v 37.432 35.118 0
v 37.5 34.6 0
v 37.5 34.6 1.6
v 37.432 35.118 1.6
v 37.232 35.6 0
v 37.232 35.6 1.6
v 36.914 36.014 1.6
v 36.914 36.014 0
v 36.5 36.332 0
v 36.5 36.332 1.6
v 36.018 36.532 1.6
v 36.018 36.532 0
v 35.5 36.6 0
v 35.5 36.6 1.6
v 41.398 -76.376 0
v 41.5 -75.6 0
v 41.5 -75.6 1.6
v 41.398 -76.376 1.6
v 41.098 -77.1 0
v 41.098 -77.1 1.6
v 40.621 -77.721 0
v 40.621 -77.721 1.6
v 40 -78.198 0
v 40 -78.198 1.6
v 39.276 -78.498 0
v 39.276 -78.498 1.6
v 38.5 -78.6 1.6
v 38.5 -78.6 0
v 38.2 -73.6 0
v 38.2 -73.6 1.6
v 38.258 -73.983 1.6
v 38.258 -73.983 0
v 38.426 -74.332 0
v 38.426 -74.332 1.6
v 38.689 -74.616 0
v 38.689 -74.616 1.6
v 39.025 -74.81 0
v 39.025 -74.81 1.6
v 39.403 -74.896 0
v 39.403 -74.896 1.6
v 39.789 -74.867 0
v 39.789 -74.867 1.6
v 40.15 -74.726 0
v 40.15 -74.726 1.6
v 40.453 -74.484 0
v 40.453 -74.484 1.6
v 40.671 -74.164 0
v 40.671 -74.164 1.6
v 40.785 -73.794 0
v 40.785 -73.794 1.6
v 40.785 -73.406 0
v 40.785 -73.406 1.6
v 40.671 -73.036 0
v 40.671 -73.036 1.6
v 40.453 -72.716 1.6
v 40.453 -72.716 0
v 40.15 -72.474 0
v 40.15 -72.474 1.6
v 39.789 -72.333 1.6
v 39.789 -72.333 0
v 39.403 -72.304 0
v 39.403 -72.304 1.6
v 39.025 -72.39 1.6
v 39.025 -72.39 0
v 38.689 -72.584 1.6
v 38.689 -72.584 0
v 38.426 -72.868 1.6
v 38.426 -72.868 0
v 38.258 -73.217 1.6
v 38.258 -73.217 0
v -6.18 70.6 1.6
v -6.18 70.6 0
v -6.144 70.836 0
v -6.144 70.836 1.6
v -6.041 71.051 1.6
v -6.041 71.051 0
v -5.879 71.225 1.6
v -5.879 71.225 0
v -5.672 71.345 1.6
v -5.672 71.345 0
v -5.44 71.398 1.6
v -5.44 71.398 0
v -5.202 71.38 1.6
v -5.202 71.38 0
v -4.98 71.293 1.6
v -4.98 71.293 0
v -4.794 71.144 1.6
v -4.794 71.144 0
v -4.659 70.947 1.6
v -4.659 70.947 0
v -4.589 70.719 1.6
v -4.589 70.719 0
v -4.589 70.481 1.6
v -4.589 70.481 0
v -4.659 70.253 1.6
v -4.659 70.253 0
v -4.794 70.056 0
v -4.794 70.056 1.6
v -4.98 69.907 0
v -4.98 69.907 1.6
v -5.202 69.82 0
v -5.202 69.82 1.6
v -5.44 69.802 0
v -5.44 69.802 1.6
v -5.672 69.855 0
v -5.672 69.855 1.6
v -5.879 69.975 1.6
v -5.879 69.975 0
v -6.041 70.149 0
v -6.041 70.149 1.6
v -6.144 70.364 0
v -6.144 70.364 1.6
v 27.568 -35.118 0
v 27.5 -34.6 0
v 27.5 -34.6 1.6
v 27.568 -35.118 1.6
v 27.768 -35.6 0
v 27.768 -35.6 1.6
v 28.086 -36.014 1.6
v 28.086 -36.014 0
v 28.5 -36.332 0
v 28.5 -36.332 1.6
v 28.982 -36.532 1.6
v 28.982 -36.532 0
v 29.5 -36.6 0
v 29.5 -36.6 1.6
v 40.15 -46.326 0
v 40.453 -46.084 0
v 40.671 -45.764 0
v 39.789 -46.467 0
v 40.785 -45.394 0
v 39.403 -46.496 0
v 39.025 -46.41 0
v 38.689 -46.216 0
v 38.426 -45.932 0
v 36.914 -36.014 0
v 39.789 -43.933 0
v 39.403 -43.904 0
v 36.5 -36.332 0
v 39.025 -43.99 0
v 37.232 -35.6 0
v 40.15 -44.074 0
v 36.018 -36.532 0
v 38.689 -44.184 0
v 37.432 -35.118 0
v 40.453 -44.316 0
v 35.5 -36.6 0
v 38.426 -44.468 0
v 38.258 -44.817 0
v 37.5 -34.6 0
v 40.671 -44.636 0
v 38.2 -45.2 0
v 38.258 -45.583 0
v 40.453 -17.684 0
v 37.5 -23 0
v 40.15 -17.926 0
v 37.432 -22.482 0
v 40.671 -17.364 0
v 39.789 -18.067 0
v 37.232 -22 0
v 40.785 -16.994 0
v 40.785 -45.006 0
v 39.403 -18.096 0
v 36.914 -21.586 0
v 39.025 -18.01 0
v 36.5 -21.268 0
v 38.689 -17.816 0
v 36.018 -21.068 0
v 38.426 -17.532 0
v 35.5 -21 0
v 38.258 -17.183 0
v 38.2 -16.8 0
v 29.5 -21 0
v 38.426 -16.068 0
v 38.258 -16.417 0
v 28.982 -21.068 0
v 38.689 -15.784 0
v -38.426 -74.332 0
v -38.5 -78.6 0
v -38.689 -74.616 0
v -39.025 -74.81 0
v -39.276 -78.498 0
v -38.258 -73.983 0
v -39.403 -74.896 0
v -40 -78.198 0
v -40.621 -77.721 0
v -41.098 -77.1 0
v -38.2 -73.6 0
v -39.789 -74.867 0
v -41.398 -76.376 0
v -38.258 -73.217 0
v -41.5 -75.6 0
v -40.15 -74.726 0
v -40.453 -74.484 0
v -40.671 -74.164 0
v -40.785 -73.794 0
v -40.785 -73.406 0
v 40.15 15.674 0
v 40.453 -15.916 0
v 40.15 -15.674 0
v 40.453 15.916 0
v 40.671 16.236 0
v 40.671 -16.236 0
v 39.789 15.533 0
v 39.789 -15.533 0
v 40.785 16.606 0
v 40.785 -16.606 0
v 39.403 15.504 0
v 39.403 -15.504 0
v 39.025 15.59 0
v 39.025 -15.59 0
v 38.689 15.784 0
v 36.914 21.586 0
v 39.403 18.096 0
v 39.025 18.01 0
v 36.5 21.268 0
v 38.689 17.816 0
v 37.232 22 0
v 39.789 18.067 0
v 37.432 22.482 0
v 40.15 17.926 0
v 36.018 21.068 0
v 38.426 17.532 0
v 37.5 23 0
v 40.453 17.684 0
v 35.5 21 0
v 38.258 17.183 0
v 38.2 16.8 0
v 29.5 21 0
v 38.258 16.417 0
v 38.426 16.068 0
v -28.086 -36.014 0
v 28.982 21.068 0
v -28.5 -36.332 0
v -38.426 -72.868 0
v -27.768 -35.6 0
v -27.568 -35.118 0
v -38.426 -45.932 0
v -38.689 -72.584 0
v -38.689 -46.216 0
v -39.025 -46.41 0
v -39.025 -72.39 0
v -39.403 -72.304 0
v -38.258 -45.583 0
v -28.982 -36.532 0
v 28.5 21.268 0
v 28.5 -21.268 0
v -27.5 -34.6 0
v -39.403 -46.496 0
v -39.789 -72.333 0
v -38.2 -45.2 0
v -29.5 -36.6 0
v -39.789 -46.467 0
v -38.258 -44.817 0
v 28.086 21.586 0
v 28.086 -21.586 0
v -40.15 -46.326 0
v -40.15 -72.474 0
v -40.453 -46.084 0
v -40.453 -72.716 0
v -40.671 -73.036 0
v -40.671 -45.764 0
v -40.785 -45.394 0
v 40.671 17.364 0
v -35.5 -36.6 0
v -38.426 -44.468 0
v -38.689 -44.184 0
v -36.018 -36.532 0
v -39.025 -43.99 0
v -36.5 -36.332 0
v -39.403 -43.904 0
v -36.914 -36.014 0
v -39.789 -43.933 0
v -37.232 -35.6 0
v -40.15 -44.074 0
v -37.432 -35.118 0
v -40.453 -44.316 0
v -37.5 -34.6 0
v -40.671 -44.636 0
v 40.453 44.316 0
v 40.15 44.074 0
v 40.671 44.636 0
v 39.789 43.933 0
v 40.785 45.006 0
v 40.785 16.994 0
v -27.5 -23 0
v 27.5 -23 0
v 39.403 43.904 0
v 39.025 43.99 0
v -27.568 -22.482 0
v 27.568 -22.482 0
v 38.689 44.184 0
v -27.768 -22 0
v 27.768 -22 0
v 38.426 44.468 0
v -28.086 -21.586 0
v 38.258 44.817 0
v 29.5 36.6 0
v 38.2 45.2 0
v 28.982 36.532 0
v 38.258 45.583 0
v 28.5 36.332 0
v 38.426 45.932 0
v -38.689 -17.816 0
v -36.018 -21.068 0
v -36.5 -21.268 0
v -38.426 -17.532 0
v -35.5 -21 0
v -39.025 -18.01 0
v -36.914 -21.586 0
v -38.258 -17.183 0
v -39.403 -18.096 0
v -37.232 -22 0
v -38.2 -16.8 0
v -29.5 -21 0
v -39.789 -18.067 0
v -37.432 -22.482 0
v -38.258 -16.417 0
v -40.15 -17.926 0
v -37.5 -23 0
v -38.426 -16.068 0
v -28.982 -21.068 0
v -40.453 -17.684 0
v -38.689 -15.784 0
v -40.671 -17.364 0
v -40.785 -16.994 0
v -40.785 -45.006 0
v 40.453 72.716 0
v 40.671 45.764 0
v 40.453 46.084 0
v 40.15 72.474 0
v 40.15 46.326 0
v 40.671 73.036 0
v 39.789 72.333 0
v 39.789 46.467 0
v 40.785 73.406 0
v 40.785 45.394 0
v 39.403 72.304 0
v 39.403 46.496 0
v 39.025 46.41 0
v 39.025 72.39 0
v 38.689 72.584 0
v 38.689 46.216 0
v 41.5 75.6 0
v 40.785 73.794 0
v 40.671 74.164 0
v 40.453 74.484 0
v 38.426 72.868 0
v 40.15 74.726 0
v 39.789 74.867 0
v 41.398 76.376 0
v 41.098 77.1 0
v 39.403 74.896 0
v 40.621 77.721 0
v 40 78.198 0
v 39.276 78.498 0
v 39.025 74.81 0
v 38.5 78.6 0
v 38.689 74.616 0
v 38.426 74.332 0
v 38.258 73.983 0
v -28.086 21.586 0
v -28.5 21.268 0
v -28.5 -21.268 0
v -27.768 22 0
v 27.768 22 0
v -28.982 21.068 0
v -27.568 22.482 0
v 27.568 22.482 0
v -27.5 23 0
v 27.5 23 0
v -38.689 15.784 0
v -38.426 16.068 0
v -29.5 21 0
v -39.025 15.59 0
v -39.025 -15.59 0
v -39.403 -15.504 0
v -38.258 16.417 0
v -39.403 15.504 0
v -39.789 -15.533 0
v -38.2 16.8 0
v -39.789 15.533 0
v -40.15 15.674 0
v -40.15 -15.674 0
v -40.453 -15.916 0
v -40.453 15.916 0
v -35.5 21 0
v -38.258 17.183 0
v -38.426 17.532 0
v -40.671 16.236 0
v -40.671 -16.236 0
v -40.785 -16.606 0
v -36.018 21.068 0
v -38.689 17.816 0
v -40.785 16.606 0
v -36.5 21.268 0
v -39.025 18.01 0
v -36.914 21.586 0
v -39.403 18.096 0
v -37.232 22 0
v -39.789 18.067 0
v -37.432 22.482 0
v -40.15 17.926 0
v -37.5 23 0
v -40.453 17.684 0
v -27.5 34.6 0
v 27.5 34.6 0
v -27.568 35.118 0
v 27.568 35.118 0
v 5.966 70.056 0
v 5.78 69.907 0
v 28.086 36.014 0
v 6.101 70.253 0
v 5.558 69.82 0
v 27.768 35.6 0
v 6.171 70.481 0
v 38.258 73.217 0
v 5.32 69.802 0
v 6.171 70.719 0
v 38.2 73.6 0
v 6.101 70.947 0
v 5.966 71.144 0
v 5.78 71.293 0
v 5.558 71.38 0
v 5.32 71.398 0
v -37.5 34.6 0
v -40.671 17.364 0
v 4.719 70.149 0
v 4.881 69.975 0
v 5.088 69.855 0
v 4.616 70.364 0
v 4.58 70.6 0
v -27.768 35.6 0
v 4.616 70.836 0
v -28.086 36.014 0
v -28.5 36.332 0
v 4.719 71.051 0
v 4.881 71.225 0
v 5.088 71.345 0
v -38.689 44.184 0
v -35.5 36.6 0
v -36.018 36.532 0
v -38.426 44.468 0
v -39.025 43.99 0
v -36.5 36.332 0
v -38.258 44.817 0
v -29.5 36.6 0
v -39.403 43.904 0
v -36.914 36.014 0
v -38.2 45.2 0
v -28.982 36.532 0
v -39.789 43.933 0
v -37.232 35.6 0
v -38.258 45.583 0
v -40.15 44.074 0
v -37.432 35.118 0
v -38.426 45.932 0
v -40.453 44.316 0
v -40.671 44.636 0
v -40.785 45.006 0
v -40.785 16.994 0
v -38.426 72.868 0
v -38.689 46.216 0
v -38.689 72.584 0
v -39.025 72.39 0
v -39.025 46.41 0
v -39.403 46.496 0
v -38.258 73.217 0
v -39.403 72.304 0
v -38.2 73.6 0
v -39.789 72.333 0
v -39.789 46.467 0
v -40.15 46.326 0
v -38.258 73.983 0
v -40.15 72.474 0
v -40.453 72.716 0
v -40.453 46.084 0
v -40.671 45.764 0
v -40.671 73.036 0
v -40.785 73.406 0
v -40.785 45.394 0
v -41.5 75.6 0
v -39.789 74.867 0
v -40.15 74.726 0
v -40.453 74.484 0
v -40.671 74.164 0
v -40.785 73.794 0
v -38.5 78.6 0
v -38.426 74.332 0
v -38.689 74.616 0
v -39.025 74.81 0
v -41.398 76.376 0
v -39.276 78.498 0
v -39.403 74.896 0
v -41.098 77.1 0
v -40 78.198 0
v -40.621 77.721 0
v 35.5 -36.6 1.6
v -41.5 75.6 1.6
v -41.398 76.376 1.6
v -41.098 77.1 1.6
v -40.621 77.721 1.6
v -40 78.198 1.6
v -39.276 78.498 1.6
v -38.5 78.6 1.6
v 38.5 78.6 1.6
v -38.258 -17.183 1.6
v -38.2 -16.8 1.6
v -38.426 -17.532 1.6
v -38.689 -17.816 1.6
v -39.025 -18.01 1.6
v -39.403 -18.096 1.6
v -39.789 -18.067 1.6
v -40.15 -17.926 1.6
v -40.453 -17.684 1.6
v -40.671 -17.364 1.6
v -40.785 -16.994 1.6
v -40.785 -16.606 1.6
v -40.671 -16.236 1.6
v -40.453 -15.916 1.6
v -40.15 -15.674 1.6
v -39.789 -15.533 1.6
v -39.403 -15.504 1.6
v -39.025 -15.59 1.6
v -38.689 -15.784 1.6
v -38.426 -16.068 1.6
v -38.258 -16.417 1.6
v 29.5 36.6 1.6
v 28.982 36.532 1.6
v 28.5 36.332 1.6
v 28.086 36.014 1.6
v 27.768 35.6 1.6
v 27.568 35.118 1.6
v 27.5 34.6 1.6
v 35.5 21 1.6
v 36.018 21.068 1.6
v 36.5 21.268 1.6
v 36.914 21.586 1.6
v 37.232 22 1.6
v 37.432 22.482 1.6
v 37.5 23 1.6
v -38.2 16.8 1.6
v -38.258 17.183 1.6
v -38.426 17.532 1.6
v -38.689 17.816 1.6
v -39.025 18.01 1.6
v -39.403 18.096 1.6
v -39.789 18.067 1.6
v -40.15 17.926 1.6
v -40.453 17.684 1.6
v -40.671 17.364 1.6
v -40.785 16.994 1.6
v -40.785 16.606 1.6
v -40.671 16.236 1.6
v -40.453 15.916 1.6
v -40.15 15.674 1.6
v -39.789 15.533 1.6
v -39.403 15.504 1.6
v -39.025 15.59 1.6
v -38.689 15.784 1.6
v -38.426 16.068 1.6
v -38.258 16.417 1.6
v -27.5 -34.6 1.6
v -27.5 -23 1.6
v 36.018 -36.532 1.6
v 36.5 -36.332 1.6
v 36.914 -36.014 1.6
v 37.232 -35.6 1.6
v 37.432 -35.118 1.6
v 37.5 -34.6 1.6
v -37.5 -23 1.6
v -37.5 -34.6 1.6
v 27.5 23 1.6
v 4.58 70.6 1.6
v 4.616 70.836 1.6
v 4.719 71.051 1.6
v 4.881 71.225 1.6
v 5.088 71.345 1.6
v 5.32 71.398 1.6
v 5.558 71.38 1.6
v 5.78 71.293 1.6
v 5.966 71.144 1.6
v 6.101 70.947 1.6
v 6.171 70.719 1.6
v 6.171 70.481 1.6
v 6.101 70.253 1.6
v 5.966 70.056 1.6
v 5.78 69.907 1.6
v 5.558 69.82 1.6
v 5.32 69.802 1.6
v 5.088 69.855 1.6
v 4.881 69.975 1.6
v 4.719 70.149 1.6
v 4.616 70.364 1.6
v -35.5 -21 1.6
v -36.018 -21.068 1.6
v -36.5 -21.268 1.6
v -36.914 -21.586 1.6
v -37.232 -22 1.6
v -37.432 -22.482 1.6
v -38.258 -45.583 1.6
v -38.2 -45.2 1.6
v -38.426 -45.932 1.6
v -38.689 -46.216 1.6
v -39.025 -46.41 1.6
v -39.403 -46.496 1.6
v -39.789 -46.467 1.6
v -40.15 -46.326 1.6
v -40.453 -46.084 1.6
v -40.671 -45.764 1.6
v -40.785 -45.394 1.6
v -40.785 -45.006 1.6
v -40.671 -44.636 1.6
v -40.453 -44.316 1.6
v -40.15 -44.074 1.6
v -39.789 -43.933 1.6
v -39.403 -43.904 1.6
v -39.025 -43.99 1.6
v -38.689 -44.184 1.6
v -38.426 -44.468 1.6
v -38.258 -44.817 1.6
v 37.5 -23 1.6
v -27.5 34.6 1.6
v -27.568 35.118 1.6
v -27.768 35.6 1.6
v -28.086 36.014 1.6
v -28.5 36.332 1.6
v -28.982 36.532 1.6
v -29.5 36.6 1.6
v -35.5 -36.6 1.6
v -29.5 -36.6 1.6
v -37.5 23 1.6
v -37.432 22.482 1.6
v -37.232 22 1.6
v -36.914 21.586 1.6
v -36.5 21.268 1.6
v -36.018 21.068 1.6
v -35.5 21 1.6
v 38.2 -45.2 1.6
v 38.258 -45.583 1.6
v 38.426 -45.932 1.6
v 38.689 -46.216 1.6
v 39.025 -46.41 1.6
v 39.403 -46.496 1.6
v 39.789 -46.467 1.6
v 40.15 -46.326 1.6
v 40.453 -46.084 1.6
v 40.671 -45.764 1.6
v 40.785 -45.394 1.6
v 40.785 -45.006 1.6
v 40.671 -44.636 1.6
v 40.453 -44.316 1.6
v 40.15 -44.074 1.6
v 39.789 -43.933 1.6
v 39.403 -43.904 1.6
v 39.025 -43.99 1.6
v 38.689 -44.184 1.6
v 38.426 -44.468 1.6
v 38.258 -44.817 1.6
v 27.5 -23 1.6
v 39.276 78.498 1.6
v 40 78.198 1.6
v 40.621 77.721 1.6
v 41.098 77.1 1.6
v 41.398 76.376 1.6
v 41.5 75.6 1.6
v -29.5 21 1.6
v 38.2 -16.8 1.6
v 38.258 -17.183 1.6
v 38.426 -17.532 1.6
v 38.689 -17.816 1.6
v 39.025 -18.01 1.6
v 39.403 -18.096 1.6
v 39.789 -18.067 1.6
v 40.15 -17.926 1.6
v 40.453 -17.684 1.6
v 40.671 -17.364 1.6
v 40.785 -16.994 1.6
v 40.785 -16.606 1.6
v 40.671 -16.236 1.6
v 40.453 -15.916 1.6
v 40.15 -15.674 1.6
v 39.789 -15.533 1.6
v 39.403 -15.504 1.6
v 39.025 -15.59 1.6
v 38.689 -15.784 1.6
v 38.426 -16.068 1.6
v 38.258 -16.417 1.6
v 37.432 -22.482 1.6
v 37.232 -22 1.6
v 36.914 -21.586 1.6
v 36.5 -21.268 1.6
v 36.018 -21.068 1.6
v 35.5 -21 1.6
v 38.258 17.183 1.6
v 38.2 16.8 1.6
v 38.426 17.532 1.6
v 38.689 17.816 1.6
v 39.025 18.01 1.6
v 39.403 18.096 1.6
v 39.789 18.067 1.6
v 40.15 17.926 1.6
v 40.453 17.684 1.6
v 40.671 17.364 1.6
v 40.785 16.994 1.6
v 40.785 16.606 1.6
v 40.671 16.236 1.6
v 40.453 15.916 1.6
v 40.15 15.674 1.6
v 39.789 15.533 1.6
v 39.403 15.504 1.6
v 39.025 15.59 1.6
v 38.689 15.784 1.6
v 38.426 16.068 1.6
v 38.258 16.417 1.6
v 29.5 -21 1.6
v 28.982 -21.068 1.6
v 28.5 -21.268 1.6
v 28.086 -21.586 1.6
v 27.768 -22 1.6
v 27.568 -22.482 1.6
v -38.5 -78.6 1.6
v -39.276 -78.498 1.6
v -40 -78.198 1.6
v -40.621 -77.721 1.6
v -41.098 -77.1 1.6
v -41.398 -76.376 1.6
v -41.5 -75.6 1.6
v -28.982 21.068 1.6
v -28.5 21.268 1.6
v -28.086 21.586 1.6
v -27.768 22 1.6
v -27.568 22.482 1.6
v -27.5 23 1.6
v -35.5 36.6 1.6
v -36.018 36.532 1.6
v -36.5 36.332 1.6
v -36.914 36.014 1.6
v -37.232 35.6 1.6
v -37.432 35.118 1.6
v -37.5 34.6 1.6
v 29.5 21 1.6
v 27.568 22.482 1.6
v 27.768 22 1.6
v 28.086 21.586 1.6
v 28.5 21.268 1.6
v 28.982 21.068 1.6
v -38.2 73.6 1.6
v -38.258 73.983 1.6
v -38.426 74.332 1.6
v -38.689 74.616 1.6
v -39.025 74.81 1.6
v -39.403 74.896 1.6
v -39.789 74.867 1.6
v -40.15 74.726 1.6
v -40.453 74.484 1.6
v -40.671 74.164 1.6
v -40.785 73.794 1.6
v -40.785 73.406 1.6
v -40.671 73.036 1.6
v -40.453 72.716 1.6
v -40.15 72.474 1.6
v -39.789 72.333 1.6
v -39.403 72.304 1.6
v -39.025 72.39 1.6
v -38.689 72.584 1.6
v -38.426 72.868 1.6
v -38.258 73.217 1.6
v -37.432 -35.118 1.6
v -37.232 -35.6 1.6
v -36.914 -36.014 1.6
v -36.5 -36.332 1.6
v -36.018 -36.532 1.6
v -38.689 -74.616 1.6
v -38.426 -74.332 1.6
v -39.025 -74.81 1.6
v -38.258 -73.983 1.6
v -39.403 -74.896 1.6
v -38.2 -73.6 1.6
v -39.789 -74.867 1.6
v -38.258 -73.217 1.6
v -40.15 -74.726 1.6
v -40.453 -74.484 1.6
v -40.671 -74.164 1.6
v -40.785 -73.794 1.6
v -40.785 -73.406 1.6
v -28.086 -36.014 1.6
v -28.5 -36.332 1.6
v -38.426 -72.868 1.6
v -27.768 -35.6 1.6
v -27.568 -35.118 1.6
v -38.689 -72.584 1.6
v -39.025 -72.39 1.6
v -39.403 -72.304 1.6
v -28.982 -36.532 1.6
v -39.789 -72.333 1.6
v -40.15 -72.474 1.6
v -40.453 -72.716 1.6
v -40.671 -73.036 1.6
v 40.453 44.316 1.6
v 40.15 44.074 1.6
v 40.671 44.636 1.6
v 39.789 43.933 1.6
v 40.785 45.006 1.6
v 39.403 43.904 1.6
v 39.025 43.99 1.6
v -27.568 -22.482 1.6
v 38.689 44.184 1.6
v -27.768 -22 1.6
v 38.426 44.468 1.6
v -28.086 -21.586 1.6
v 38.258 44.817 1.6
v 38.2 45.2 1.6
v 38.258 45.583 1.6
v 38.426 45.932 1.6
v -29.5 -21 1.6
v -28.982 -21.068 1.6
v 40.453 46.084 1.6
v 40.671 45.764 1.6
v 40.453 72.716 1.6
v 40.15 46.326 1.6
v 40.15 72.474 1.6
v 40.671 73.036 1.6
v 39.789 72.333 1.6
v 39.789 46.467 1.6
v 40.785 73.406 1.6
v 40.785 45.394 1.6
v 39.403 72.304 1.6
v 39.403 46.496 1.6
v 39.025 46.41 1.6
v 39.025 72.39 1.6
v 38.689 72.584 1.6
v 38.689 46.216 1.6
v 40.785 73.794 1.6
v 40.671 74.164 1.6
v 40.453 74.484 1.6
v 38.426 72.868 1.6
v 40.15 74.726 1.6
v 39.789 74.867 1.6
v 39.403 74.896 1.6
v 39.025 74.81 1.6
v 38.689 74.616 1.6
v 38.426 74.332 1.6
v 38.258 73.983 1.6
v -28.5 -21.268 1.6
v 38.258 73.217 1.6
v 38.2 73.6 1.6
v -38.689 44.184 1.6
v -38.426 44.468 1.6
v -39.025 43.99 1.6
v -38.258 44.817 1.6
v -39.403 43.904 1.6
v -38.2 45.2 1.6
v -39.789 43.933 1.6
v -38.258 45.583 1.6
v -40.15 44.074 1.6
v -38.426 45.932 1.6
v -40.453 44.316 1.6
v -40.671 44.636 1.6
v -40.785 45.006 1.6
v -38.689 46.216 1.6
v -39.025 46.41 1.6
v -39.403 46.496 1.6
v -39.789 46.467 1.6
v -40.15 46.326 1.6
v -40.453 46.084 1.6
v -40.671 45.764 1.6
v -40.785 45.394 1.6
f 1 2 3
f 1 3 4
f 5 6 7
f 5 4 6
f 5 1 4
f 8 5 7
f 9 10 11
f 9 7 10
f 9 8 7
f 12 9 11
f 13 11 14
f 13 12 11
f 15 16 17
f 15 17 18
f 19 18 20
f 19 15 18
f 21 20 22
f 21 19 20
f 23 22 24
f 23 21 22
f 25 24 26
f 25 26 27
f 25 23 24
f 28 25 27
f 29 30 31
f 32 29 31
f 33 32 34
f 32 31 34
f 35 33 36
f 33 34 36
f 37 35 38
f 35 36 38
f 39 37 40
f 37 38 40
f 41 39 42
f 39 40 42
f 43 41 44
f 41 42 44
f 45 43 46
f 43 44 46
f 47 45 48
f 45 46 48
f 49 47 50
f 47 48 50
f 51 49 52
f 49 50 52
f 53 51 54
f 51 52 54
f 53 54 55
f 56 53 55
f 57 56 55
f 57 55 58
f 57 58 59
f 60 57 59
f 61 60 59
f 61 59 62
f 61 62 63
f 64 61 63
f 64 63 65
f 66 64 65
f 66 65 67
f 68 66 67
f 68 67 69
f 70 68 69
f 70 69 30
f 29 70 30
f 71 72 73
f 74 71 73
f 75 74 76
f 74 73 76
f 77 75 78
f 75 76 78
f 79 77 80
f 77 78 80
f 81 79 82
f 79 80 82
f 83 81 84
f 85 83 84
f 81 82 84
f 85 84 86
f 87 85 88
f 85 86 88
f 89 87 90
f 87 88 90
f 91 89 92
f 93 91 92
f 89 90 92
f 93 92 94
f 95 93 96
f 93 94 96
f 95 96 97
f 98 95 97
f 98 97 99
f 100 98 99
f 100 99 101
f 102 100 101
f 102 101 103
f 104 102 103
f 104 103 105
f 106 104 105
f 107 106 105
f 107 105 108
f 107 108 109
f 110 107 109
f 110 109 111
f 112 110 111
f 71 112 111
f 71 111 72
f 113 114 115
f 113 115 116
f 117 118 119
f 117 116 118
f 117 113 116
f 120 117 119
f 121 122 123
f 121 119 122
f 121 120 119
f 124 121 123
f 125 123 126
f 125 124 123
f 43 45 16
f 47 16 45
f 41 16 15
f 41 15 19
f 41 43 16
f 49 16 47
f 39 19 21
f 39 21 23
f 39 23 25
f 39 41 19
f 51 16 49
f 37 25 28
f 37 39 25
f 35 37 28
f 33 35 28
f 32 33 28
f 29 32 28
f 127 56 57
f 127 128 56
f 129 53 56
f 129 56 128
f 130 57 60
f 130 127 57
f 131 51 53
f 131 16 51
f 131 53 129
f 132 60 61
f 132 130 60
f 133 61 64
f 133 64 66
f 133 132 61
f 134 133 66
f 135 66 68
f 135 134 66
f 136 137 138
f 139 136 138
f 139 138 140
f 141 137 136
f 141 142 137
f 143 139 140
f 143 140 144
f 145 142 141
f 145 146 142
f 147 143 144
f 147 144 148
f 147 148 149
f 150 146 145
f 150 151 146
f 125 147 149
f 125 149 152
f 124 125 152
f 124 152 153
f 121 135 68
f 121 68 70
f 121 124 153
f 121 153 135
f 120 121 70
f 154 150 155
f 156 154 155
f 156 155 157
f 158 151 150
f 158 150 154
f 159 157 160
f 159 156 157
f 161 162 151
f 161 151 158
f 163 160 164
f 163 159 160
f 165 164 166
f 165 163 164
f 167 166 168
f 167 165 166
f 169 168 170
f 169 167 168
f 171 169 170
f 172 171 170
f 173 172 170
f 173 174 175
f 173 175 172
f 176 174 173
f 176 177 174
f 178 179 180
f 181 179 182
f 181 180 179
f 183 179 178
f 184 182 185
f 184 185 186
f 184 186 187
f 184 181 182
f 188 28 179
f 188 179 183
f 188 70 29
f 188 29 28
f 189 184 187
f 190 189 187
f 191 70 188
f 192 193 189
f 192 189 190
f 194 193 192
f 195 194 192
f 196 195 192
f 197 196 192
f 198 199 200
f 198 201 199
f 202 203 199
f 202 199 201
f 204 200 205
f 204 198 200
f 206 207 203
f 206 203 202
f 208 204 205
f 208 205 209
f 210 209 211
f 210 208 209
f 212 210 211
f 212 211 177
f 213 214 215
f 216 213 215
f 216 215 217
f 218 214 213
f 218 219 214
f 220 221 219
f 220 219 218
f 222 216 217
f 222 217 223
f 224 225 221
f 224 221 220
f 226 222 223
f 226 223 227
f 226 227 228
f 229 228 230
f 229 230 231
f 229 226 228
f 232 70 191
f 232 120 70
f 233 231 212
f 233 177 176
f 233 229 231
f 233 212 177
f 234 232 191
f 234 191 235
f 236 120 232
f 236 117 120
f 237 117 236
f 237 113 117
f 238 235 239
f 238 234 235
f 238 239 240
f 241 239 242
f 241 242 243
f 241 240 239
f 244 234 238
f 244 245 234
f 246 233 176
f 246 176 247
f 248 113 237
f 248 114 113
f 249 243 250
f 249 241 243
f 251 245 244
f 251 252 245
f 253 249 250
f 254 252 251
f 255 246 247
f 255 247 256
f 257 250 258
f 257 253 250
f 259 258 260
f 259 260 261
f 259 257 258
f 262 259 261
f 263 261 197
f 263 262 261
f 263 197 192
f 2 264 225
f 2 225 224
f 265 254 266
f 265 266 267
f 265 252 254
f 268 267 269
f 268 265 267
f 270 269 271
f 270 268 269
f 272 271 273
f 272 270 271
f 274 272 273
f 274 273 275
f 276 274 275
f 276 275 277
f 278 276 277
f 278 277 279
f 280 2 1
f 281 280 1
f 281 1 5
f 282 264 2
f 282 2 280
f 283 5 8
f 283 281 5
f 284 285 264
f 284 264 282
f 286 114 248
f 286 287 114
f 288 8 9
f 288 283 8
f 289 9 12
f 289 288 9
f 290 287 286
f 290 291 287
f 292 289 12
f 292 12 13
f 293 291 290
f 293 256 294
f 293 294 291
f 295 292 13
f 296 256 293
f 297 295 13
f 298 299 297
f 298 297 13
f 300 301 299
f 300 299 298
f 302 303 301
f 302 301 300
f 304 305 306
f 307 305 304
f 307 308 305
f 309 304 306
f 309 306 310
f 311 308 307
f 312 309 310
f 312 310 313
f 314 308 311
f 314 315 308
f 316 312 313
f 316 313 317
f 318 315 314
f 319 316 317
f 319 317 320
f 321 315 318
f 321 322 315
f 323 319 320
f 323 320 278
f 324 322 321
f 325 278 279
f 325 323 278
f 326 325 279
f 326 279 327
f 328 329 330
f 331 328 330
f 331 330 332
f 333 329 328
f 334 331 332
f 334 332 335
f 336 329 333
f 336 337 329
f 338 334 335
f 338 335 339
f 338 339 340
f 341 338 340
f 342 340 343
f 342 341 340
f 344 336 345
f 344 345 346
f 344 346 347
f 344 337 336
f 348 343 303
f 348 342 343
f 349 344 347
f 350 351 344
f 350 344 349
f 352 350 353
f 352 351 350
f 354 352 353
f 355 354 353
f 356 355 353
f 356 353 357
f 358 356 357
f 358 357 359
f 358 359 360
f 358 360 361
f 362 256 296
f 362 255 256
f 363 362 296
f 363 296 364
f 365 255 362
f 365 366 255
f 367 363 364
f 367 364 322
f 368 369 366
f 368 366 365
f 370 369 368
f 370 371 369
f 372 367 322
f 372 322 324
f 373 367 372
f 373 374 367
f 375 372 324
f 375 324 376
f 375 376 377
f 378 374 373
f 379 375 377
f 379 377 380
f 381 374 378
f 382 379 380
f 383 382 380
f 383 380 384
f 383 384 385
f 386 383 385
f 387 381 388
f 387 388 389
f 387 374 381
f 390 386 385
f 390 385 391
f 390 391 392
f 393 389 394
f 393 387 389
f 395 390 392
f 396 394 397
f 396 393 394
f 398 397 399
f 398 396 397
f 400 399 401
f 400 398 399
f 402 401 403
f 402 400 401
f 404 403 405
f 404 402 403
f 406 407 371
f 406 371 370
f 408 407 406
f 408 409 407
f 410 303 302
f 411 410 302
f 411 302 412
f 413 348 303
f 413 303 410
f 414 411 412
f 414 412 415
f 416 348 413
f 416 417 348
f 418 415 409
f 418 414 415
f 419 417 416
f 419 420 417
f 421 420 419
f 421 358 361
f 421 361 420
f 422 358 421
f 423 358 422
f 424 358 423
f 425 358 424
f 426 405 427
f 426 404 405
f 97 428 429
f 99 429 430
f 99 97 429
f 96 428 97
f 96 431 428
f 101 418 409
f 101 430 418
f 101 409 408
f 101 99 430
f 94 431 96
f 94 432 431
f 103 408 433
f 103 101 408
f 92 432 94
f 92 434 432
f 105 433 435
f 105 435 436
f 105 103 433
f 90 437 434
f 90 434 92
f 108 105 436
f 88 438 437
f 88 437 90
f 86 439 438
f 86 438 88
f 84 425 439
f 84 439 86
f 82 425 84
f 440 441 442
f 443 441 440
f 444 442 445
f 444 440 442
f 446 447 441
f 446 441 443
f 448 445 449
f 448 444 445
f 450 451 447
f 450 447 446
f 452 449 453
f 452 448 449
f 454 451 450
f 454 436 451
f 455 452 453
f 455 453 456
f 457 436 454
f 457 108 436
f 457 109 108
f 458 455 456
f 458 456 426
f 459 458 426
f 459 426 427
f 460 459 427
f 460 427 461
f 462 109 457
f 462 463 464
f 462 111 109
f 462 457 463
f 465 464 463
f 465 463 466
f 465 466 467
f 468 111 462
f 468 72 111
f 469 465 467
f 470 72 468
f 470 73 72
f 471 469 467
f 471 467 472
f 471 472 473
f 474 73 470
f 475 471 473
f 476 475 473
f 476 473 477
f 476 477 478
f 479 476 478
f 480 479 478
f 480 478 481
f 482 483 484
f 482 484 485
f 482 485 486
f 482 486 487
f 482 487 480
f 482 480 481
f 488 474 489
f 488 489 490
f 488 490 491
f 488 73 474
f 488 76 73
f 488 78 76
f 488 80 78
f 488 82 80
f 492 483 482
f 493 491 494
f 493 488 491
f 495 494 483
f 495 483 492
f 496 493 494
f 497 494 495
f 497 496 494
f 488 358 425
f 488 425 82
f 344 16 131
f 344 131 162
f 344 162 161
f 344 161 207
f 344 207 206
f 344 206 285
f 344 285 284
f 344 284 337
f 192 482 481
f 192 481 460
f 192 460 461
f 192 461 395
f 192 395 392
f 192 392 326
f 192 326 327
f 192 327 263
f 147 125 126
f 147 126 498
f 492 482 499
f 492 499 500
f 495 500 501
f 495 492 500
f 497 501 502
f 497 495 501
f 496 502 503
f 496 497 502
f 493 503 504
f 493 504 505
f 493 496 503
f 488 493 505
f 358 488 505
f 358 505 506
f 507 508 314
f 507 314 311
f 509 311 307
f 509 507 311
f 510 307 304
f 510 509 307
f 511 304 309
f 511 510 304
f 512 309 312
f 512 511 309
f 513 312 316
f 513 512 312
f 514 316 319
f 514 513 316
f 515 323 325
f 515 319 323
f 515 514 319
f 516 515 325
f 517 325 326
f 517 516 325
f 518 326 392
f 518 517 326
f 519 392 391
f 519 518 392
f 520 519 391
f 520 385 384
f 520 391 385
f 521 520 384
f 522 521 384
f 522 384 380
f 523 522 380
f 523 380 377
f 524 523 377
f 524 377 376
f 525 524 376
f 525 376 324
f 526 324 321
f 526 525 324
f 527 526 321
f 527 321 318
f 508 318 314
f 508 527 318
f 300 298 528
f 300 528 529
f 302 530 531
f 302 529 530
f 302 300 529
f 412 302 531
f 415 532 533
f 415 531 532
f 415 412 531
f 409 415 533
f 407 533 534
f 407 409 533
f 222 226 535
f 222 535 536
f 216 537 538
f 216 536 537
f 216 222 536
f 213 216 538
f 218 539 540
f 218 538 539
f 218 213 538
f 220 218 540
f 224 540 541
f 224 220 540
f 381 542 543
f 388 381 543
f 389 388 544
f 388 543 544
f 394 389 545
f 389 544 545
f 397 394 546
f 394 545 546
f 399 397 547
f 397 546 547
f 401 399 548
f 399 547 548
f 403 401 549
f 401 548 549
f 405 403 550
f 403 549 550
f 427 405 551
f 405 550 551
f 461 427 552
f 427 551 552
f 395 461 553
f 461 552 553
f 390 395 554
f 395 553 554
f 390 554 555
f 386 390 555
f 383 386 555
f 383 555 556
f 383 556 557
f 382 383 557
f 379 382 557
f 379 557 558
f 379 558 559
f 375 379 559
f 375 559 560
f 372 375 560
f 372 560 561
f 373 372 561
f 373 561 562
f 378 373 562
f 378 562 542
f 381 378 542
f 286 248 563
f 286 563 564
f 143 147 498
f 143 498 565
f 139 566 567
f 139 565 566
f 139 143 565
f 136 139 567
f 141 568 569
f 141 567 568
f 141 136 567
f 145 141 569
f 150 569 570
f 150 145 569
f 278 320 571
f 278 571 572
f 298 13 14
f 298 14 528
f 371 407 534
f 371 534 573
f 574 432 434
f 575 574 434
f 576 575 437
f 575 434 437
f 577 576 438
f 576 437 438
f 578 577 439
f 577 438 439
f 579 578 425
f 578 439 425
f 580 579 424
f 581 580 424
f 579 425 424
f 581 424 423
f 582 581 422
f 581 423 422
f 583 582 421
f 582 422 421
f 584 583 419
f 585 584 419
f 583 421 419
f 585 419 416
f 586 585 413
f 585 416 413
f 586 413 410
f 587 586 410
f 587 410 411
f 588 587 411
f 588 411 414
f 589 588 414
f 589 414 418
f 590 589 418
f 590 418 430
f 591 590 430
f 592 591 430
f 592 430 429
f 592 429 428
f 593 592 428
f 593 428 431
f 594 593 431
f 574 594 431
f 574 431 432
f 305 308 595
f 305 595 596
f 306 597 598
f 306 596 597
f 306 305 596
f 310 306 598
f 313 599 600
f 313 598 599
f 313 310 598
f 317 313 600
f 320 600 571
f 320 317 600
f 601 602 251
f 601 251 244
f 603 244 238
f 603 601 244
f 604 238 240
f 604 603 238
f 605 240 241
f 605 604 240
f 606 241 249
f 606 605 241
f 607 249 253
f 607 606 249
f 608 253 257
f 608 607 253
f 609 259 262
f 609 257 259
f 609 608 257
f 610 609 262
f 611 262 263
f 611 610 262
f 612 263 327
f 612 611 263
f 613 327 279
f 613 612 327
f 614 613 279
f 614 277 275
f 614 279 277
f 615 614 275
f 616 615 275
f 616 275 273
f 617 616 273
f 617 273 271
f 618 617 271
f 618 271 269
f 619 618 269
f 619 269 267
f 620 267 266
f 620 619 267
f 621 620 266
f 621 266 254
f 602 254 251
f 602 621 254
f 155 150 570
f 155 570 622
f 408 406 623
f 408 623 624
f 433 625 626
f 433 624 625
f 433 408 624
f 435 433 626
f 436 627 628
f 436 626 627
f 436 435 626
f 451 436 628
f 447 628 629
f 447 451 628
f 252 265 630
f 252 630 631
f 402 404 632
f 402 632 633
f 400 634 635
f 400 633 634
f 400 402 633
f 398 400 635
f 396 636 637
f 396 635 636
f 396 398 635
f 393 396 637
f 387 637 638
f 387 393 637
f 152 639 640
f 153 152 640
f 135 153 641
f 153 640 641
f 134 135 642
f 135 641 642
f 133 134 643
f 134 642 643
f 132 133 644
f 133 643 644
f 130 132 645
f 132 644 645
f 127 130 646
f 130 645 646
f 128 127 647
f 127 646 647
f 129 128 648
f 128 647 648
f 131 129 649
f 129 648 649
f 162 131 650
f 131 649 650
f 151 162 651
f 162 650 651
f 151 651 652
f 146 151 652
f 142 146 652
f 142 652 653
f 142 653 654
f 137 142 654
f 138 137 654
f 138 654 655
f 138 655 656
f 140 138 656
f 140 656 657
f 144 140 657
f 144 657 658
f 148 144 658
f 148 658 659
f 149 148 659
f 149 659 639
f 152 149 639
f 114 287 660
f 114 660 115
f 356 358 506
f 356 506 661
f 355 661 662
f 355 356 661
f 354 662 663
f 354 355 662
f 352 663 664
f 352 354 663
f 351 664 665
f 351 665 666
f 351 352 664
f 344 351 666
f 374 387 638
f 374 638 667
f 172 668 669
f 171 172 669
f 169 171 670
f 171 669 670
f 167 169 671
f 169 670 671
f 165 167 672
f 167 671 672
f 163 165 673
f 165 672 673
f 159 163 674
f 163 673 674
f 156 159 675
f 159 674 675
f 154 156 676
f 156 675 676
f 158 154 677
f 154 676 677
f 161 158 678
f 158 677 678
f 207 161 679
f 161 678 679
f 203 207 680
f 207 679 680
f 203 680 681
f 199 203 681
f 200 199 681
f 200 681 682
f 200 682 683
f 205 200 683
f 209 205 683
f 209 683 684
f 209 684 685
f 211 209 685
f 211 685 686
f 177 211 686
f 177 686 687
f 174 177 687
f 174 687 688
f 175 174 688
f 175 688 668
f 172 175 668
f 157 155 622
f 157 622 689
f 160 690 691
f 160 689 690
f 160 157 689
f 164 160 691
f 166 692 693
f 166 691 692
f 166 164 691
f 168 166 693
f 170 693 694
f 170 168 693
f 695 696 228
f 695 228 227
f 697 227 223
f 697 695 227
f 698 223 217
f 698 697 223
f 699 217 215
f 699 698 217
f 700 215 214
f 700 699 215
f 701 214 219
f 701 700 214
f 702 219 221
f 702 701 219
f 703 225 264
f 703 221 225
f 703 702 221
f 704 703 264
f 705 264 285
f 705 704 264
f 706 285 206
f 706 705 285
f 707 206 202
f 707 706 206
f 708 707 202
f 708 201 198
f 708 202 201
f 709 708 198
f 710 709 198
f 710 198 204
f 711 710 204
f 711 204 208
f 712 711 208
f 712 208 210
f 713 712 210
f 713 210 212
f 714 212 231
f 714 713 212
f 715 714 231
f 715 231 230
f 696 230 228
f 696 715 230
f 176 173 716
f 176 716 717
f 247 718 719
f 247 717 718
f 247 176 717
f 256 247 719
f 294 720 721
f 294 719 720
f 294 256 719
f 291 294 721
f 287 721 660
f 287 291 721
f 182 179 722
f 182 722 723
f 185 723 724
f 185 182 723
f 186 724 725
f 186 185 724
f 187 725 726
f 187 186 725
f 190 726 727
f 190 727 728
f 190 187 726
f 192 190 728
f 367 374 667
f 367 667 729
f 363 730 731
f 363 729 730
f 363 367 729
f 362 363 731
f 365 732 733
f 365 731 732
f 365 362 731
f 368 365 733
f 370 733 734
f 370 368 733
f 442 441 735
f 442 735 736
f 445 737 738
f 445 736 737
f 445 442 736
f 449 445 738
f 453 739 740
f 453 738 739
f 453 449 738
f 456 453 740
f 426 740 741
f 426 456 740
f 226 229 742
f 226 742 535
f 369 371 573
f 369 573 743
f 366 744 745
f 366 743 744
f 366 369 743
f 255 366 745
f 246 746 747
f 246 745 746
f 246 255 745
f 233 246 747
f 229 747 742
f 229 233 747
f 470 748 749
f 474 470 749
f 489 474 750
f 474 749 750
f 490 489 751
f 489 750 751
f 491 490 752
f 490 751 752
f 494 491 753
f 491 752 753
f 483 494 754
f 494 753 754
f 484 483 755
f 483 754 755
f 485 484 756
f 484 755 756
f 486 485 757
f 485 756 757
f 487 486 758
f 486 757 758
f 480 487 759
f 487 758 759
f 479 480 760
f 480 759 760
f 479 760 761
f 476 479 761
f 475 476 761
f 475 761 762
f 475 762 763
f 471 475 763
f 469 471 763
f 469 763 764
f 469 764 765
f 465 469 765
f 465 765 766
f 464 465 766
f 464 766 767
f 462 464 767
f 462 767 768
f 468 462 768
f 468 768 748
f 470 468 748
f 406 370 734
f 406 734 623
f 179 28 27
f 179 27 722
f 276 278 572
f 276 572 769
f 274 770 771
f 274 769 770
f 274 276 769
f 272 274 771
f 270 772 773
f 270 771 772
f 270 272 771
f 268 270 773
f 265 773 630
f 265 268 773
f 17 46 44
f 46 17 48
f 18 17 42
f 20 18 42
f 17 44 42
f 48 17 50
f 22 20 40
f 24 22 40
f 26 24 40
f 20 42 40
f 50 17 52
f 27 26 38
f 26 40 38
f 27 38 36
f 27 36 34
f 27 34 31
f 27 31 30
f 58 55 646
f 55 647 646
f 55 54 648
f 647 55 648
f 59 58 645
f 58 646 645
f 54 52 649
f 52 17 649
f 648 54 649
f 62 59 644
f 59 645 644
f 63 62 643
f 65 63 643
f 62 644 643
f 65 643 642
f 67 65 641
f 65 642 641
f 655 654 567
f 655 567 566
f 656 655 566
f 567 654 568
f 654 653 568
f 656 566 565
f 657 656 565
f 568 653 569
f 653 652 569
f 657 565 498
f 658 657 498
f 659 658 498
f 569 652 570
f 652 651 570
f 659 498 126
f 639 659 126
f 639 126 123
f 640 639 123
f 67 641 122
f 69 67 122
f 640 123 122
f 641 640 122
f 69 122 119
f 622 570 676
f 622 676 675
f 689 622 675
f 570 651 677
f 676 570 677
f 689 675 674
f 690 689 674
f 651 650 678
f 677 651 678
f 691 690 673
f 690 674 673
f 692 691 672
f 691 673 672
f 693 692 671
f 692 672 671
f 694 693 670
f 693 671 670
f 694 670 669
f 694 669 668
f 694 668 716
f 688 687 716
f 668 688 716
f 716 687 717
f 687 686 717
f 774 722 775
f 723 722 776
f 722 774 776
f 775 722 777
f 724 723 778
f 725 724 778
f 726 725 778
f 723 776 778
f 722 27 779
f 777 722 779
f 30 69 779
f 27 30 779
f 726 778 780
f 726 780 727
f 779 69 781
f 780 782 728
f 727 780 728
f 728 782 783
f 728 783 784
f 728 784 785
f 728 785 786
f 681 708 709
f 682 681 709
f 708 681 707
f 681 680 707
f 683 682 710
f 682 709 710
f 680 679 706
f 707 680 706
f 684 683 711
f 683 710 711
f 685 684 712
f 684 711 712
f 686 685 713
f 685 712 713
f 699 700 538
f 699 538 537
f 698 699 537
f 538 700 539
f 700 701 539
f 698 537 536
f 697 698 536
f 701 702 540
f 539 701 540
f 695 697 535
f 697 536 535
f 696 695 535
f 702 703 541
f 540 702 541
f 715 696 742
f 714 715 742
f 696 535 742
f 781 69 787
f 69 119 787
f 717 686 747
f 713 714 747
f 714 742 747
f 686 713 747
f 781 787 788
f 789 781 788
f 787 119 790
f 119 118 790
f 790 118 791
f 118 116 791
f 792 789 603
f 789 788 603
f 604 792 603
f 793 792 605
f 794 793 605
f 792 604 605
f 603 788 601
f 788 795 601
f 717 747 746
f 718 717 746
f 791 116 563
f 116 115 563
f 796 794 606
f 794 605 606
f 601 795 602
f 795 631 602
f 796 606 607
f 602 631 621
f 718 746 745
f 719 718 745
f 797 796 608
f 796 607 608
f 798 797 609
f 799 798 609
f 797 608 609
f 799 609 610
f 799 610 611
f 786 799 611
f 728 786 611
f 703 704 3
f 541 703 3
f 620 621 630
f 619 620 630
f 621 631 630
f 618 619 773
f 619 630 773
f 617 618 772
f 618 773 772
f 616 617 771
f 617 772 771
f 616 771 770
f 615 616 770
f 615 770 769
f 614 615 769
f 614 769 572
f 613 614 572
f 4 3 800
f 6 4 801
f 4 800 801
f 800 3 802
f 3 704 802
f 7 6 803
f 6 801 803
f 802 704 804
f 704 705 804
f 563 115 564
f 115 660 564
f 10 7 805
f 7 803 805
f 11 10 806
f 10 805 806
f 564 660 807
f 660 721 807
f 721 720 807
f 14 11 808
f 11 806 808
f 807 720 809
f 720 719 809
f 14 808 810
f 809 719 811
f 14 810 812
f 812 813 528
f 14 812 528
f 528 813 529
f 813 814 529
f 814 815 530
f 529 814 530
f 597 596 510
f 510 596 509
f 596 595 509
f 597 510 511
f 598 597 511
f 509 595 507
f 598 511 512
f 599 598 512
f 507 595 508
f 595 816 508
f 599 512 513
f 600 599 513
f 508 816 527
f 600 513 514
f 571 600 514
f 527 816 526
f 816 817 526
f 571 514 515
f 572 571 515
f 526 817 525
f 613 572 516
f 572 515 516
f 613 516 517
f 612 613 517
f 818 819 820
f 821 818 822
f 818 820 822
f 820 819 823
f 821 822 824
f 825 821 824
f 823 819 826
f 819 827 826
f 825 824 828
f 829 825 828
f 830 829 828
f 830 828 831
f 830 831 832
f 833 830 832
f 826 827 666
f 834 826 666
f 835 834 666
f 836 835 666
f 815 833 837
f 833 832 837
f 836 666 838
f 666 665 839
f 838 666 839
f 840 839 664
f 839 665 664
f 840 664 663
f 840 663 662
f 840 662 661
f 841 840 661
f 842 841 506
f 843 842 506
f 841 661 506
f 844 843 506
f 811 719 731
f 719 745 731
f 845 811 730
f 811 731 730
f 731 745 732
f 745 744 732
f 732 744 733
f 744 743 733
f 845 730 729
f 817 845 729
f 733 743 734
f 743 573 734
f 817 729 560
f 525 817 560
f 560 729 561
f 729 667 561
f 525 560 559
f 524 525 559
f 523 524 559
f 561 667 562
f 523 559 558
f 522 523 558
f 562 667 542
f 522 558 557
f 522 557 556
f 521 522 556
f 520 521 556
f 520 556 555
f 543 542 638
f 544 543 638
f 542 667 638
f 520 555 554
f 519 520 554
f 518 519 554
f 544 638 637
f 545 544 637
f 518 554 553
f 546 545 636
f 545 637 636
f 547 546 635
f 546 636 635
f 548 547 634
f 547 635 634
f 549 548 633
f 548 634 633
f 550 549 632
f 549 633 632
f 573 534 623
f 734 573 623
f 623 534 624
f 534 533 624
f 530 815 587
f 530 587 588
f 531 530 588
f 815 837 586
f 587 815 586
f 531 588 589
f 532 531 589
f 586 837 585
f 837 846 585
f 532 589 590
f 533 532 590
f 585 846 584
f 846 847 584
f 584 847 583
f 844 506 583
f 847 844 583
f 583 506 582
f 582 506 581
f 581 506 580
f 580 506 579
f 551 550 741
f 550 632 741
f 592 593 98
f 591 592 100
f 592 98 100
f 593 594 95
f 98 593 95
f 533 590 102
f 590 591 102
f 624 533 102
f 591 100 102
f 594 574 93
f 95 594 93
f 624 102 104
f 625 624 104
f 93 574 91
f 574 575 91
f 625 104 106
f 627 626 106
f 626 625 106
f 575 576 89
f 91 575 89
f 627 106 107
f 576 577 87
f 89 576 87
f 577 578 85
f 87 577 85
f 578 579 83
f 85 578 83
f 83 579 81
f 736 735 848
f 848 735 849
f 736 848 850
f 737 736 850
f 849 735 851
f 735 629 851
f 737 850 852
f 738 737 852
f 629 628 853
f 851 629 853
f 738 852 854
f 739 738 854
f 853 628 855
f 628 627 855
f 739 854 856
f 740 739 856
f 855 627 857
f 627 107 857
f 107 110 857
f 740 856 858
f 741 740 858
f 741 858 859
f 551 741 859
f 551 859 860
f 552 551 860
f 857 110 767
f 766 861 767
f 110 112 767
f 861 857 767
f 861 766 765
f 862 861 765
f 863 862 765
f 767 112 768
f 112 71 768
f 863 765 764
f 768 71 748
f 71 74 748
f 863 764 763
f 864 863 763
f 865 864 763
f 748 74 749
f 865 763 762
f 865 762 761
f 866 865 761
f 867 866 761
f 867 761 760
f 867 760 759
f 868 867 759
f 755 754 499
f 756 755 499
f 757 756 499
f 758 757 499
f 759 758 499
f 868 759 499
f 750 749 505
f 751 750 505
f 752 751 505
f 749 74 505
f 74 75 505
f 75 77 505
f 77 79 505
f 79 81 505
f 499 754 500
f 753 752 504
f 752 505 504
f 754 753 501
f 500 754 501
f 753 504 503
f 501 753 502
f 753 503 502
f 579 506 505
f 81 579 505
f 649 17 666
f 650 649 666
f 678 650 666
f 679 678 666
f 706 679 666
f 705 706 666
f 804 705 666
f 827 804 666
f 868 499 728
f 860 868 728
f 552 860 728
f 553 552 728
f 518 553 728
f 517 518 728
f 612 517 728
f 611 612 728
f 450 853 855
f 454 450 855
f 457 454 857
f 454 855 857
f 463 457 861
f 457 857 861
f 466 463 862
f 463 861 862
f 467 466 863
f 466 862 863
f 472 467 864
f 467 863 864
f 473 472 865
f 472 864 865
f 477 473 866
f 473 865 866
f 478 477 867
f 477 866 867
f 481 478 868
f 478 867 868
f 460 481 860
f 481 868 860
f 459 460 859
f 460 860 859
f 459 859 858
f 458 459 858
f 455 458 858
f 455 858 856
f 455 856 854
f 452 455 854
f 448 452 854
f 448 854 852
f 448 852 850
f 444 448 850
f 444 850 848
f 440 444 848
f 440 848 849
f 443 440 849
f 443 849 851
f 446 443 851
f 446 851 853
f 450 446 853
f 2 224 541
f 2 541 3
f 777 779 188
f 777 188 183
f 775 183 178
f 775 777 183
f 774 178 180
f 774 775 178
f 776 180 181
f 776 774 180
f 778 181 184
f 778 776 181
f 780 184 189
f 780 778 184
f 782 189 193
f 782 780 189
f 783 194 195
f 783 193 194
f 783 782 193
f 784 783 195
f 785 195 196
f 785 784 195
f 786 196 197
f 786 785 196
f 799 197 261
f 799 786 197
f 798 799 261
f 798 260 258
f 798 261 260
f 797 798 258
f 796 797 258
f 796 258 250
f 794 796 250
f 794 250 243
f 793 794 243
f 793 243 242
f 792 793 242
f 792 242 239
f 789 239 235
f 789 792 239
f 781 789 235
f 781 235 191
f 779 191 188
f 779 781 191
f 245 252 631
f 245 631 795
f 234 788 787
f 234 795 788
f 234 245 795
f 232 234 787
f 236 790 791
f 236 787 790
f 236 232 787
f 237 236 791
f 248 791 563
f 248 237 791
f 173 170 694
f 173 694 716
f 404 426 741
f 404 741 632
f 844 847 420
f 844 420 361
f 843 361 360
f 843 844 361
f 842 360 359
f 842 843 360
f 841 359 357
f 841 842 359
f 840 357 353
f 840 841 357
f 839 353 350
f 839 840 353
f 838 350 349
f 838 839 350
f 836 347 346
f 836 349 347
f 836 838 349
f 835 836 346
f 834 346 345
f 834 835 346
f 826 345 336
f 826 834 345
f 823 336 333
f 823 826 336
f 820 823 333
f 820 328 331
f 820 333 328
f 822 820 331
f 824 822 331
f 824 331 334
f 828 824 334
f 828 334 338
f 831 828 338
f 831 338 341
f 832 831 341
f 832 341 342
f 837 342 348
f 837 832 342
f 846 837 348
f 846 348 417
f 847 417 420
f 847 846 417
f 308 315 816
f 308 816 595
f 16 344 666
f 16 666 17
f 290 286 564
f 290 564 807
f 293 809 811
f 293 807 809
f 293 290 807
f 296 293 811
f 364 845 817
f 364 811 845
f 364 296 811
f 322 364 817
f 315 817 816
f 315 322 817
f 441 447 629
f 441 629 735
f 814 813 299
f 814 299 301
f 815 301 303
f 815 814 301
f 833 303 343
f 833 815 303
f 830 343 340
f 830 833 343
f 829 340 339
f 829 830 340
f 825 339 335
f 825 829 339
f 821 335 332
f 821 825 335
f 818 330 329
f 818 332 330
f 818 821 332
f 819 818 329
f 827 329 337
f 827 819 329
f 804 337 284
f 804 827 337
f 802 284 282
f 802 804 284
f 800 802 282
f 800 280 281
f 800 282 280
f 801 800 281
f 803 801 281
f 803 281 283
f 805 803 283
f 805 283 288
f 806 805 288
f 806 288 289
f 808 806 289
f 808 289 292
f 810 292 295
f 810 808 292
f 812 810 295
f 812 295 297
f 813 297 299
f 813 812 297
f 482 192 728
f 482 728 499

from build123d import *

# Parameters (mm, degrees)
GENERAL_SHAPE_DEPTH        = 1.6
M2_CLEARANCE_HOLE1_D       = 2.6
MIRROR2_COPY_1_D           = 2.6
SKETCH5_R                  = 0.8
CONNECTOR_HOLES_DEPTH      = 89.897525275
STAR_TRACKER_CUTOUTS_DEPTH = 89.897525275


with BuildPart() as part:
    # Sketch1 → General Shape (new body)
    with BuildSketch(Plane.XY):
        with BuildLine():
            Line((-38.5, 78.6), (38.5, 78.6))
            ThreePointArc((38.5, 78.6), (40.621320344, 77.721320344), (41.5, 75.6))
            Line((41.5, 75.6), (41.5, -75.6))
            ThreePointArc((41.5, -75.6), (40.621320344, -77.721320344), (38.5, -78.6))
            Line((38.5, -78.6), (-38.5, -78.6))
            ThreePointArc((-38.5, -78.6), (-40.621320344, -77.721320344), (-41.5, -75.6))
            Line((-41.5, -75.6), (-41.5, 75.6))
            ThreePointArc((-41.5, 75.6), (-40.621320344, 77.721320344), (-38.5, 78.6))
        make_face()
    extrude(amount=GENERAL_SHAPE_DEPTH)

    # M2 Clearance Hole1 (through all)
    with Locations(Plane(origin=(-39.5, 73.6, 0), x_dir=(-1, 0, 0), z_dir=(0, 0, -1))):
        with Locations((0, 0), (0, -28.4), (0, -56.8)):
            m2_clearance_hole1 = Hole(M2_CLEARANCE_HOLE1_D / 2)

    # Mirror1: M2 Clearance Hole1 across plane
    add(m2_clearance_hole1.mirror(Plane(origin=(0, 0, 0), x_dir=(0, 0, 1), z_dir=(1, 0, 0))), mode=Mode.SUBTRACT)

    # Mirror2: M2 Clearance Hole1 across plane
    add(m2_clearance_hole1.mirror(Plane.ZX), mode=Mode.SUBTRACT)

    # Mirror2 copy 1 (through all)
    with Locations(Plane(origin=(39.5, -73.6, 0), x_dir=(1, 0, 0), z_dir=(0, 0, -1))):
        with Locations((0, 0), (0, -28.4), (0, -56.8)):
            Hole(MIRROR2_COPY_1_D / 2)

    # Sketch5 → Connector holes (cut, through all)
    with BuildSketch(Plane(origin=(0, 0, 0), x_dir=(-1, 0, 0), z_dir=(0, 0, -1))):
        with Locations((-5.38, 70.6)):
            Circle(SKETCH5_R)
        with Locations((5.38, 70.6)):
            Circle(SKETCH5_R)
    extrude(amount=-CONNECTOR_HOLES_DEPTH, mode=Mode.SUBTRACT)

    # Sketch6 → Star Tracker Cutouts (cut, through all)
    with BuildSketch(Plane(origin=(0, 0, 0), x_dir=(-1, 0, 0), z_dir=(0, 0, -1))):
        with BuildLine():
            Line((-35.5, 36.6), (-29.5, 36.6))
            ThreePointArc((-29.5, 36.6), (-28.085786438, 36.014213562), (-27.5, 34.6))
            Line((-27.5, 34.6), (-27.5, 23))
            ThreePointArc((-27.5, 23), (-28.085786438, 21.585786438), (-29.5, 21))
            Line((-29.5, 21), (-35.5, 21))
            ThreePointArc((-35.5, 21), (-36.914213562, 21.585786438), (-37.5, 23))
            Line((-37.5, 23), (-37.5, 34.6))
            ThreePointArc((-37.5, 34.6), (-36.914213562, 36.014213562), (-35.5, 36.6))
        make_face()
        with BuildLine():
            Line((29.5, 36.6), (35.5, 36.6))
            ThreePointArc((35.5, 36.6), (36.914213562, 36.014213562), (37.5, 34.6))
            Line((37.5, 34.6), (37.5, 23))
            ThreePointArc((37.5, 23), (36.914213562, 21.585786438), (35.5, 21))
            Line((35.5, 21), (29.5, 21))
            ThreePointArc((29.5, 21), (28.085786438, 21.585786438), (27.5, 23))
            Line((27.5, 23), (27.5, 34.6))
            ThreePointArc((27.5, 34.6), (28.085786438, 36.014213562), (29.5, 36.6))
        make_face()
        with BuildLine():
            Line((-35.5, -21), (-29.5, -21))
            ThreePointArc((-29.5, -21), (-28.085786438, -21.585786438), (-27.5, -23))
            Line((-27.5, -23), (-27.5, -34.6))
            ThreePointArc((-27.5, -34.6), (-28.085786438, -36.014213562), (-29.5, -36.6))
            Line((-29.5, -36.6), (-35.5, -36.6))
            ThreePointArc((-35.5, -36.6), (-36.914213562, -36.014213562), (-37.5, -34.6))
            Line((-37.5, -34.6), (-37.5, -23))
            ThreePointArc((-37.5, -23), (-36.914213562, -21.585786438), (-35.5, -21))
        make_face()
        with BuildLine():
            Line((29.5, -21), (35.5, -21))
            ThreePointArc((35.5, -21), (36.914213562, -21.585786438), (37.5, -23))
            Line((37.5, -23), (37.5, -34.6))
            ThreePointArc((37.5, -34.6), (36.914213562, -36.014213562), (35.5, -36.6))
            Line((35.5, -36.6), (29.5, -36.6))
            ThreePointArc((29.5, -36.6), (28.085786438, -36.014213562), (27.5, -34.6))
            Line((27.5, -34.6), (27.5, -23))
            ThreePointArc((27.5, -23), (28.085786438, -21.585786438), (29.5, -21))
        make_face()
    extrude(amount=-STAR_TRACKER_CUTOUTS_DEPTH, mode=Mode.SUBTRACT)


solid = part.part
